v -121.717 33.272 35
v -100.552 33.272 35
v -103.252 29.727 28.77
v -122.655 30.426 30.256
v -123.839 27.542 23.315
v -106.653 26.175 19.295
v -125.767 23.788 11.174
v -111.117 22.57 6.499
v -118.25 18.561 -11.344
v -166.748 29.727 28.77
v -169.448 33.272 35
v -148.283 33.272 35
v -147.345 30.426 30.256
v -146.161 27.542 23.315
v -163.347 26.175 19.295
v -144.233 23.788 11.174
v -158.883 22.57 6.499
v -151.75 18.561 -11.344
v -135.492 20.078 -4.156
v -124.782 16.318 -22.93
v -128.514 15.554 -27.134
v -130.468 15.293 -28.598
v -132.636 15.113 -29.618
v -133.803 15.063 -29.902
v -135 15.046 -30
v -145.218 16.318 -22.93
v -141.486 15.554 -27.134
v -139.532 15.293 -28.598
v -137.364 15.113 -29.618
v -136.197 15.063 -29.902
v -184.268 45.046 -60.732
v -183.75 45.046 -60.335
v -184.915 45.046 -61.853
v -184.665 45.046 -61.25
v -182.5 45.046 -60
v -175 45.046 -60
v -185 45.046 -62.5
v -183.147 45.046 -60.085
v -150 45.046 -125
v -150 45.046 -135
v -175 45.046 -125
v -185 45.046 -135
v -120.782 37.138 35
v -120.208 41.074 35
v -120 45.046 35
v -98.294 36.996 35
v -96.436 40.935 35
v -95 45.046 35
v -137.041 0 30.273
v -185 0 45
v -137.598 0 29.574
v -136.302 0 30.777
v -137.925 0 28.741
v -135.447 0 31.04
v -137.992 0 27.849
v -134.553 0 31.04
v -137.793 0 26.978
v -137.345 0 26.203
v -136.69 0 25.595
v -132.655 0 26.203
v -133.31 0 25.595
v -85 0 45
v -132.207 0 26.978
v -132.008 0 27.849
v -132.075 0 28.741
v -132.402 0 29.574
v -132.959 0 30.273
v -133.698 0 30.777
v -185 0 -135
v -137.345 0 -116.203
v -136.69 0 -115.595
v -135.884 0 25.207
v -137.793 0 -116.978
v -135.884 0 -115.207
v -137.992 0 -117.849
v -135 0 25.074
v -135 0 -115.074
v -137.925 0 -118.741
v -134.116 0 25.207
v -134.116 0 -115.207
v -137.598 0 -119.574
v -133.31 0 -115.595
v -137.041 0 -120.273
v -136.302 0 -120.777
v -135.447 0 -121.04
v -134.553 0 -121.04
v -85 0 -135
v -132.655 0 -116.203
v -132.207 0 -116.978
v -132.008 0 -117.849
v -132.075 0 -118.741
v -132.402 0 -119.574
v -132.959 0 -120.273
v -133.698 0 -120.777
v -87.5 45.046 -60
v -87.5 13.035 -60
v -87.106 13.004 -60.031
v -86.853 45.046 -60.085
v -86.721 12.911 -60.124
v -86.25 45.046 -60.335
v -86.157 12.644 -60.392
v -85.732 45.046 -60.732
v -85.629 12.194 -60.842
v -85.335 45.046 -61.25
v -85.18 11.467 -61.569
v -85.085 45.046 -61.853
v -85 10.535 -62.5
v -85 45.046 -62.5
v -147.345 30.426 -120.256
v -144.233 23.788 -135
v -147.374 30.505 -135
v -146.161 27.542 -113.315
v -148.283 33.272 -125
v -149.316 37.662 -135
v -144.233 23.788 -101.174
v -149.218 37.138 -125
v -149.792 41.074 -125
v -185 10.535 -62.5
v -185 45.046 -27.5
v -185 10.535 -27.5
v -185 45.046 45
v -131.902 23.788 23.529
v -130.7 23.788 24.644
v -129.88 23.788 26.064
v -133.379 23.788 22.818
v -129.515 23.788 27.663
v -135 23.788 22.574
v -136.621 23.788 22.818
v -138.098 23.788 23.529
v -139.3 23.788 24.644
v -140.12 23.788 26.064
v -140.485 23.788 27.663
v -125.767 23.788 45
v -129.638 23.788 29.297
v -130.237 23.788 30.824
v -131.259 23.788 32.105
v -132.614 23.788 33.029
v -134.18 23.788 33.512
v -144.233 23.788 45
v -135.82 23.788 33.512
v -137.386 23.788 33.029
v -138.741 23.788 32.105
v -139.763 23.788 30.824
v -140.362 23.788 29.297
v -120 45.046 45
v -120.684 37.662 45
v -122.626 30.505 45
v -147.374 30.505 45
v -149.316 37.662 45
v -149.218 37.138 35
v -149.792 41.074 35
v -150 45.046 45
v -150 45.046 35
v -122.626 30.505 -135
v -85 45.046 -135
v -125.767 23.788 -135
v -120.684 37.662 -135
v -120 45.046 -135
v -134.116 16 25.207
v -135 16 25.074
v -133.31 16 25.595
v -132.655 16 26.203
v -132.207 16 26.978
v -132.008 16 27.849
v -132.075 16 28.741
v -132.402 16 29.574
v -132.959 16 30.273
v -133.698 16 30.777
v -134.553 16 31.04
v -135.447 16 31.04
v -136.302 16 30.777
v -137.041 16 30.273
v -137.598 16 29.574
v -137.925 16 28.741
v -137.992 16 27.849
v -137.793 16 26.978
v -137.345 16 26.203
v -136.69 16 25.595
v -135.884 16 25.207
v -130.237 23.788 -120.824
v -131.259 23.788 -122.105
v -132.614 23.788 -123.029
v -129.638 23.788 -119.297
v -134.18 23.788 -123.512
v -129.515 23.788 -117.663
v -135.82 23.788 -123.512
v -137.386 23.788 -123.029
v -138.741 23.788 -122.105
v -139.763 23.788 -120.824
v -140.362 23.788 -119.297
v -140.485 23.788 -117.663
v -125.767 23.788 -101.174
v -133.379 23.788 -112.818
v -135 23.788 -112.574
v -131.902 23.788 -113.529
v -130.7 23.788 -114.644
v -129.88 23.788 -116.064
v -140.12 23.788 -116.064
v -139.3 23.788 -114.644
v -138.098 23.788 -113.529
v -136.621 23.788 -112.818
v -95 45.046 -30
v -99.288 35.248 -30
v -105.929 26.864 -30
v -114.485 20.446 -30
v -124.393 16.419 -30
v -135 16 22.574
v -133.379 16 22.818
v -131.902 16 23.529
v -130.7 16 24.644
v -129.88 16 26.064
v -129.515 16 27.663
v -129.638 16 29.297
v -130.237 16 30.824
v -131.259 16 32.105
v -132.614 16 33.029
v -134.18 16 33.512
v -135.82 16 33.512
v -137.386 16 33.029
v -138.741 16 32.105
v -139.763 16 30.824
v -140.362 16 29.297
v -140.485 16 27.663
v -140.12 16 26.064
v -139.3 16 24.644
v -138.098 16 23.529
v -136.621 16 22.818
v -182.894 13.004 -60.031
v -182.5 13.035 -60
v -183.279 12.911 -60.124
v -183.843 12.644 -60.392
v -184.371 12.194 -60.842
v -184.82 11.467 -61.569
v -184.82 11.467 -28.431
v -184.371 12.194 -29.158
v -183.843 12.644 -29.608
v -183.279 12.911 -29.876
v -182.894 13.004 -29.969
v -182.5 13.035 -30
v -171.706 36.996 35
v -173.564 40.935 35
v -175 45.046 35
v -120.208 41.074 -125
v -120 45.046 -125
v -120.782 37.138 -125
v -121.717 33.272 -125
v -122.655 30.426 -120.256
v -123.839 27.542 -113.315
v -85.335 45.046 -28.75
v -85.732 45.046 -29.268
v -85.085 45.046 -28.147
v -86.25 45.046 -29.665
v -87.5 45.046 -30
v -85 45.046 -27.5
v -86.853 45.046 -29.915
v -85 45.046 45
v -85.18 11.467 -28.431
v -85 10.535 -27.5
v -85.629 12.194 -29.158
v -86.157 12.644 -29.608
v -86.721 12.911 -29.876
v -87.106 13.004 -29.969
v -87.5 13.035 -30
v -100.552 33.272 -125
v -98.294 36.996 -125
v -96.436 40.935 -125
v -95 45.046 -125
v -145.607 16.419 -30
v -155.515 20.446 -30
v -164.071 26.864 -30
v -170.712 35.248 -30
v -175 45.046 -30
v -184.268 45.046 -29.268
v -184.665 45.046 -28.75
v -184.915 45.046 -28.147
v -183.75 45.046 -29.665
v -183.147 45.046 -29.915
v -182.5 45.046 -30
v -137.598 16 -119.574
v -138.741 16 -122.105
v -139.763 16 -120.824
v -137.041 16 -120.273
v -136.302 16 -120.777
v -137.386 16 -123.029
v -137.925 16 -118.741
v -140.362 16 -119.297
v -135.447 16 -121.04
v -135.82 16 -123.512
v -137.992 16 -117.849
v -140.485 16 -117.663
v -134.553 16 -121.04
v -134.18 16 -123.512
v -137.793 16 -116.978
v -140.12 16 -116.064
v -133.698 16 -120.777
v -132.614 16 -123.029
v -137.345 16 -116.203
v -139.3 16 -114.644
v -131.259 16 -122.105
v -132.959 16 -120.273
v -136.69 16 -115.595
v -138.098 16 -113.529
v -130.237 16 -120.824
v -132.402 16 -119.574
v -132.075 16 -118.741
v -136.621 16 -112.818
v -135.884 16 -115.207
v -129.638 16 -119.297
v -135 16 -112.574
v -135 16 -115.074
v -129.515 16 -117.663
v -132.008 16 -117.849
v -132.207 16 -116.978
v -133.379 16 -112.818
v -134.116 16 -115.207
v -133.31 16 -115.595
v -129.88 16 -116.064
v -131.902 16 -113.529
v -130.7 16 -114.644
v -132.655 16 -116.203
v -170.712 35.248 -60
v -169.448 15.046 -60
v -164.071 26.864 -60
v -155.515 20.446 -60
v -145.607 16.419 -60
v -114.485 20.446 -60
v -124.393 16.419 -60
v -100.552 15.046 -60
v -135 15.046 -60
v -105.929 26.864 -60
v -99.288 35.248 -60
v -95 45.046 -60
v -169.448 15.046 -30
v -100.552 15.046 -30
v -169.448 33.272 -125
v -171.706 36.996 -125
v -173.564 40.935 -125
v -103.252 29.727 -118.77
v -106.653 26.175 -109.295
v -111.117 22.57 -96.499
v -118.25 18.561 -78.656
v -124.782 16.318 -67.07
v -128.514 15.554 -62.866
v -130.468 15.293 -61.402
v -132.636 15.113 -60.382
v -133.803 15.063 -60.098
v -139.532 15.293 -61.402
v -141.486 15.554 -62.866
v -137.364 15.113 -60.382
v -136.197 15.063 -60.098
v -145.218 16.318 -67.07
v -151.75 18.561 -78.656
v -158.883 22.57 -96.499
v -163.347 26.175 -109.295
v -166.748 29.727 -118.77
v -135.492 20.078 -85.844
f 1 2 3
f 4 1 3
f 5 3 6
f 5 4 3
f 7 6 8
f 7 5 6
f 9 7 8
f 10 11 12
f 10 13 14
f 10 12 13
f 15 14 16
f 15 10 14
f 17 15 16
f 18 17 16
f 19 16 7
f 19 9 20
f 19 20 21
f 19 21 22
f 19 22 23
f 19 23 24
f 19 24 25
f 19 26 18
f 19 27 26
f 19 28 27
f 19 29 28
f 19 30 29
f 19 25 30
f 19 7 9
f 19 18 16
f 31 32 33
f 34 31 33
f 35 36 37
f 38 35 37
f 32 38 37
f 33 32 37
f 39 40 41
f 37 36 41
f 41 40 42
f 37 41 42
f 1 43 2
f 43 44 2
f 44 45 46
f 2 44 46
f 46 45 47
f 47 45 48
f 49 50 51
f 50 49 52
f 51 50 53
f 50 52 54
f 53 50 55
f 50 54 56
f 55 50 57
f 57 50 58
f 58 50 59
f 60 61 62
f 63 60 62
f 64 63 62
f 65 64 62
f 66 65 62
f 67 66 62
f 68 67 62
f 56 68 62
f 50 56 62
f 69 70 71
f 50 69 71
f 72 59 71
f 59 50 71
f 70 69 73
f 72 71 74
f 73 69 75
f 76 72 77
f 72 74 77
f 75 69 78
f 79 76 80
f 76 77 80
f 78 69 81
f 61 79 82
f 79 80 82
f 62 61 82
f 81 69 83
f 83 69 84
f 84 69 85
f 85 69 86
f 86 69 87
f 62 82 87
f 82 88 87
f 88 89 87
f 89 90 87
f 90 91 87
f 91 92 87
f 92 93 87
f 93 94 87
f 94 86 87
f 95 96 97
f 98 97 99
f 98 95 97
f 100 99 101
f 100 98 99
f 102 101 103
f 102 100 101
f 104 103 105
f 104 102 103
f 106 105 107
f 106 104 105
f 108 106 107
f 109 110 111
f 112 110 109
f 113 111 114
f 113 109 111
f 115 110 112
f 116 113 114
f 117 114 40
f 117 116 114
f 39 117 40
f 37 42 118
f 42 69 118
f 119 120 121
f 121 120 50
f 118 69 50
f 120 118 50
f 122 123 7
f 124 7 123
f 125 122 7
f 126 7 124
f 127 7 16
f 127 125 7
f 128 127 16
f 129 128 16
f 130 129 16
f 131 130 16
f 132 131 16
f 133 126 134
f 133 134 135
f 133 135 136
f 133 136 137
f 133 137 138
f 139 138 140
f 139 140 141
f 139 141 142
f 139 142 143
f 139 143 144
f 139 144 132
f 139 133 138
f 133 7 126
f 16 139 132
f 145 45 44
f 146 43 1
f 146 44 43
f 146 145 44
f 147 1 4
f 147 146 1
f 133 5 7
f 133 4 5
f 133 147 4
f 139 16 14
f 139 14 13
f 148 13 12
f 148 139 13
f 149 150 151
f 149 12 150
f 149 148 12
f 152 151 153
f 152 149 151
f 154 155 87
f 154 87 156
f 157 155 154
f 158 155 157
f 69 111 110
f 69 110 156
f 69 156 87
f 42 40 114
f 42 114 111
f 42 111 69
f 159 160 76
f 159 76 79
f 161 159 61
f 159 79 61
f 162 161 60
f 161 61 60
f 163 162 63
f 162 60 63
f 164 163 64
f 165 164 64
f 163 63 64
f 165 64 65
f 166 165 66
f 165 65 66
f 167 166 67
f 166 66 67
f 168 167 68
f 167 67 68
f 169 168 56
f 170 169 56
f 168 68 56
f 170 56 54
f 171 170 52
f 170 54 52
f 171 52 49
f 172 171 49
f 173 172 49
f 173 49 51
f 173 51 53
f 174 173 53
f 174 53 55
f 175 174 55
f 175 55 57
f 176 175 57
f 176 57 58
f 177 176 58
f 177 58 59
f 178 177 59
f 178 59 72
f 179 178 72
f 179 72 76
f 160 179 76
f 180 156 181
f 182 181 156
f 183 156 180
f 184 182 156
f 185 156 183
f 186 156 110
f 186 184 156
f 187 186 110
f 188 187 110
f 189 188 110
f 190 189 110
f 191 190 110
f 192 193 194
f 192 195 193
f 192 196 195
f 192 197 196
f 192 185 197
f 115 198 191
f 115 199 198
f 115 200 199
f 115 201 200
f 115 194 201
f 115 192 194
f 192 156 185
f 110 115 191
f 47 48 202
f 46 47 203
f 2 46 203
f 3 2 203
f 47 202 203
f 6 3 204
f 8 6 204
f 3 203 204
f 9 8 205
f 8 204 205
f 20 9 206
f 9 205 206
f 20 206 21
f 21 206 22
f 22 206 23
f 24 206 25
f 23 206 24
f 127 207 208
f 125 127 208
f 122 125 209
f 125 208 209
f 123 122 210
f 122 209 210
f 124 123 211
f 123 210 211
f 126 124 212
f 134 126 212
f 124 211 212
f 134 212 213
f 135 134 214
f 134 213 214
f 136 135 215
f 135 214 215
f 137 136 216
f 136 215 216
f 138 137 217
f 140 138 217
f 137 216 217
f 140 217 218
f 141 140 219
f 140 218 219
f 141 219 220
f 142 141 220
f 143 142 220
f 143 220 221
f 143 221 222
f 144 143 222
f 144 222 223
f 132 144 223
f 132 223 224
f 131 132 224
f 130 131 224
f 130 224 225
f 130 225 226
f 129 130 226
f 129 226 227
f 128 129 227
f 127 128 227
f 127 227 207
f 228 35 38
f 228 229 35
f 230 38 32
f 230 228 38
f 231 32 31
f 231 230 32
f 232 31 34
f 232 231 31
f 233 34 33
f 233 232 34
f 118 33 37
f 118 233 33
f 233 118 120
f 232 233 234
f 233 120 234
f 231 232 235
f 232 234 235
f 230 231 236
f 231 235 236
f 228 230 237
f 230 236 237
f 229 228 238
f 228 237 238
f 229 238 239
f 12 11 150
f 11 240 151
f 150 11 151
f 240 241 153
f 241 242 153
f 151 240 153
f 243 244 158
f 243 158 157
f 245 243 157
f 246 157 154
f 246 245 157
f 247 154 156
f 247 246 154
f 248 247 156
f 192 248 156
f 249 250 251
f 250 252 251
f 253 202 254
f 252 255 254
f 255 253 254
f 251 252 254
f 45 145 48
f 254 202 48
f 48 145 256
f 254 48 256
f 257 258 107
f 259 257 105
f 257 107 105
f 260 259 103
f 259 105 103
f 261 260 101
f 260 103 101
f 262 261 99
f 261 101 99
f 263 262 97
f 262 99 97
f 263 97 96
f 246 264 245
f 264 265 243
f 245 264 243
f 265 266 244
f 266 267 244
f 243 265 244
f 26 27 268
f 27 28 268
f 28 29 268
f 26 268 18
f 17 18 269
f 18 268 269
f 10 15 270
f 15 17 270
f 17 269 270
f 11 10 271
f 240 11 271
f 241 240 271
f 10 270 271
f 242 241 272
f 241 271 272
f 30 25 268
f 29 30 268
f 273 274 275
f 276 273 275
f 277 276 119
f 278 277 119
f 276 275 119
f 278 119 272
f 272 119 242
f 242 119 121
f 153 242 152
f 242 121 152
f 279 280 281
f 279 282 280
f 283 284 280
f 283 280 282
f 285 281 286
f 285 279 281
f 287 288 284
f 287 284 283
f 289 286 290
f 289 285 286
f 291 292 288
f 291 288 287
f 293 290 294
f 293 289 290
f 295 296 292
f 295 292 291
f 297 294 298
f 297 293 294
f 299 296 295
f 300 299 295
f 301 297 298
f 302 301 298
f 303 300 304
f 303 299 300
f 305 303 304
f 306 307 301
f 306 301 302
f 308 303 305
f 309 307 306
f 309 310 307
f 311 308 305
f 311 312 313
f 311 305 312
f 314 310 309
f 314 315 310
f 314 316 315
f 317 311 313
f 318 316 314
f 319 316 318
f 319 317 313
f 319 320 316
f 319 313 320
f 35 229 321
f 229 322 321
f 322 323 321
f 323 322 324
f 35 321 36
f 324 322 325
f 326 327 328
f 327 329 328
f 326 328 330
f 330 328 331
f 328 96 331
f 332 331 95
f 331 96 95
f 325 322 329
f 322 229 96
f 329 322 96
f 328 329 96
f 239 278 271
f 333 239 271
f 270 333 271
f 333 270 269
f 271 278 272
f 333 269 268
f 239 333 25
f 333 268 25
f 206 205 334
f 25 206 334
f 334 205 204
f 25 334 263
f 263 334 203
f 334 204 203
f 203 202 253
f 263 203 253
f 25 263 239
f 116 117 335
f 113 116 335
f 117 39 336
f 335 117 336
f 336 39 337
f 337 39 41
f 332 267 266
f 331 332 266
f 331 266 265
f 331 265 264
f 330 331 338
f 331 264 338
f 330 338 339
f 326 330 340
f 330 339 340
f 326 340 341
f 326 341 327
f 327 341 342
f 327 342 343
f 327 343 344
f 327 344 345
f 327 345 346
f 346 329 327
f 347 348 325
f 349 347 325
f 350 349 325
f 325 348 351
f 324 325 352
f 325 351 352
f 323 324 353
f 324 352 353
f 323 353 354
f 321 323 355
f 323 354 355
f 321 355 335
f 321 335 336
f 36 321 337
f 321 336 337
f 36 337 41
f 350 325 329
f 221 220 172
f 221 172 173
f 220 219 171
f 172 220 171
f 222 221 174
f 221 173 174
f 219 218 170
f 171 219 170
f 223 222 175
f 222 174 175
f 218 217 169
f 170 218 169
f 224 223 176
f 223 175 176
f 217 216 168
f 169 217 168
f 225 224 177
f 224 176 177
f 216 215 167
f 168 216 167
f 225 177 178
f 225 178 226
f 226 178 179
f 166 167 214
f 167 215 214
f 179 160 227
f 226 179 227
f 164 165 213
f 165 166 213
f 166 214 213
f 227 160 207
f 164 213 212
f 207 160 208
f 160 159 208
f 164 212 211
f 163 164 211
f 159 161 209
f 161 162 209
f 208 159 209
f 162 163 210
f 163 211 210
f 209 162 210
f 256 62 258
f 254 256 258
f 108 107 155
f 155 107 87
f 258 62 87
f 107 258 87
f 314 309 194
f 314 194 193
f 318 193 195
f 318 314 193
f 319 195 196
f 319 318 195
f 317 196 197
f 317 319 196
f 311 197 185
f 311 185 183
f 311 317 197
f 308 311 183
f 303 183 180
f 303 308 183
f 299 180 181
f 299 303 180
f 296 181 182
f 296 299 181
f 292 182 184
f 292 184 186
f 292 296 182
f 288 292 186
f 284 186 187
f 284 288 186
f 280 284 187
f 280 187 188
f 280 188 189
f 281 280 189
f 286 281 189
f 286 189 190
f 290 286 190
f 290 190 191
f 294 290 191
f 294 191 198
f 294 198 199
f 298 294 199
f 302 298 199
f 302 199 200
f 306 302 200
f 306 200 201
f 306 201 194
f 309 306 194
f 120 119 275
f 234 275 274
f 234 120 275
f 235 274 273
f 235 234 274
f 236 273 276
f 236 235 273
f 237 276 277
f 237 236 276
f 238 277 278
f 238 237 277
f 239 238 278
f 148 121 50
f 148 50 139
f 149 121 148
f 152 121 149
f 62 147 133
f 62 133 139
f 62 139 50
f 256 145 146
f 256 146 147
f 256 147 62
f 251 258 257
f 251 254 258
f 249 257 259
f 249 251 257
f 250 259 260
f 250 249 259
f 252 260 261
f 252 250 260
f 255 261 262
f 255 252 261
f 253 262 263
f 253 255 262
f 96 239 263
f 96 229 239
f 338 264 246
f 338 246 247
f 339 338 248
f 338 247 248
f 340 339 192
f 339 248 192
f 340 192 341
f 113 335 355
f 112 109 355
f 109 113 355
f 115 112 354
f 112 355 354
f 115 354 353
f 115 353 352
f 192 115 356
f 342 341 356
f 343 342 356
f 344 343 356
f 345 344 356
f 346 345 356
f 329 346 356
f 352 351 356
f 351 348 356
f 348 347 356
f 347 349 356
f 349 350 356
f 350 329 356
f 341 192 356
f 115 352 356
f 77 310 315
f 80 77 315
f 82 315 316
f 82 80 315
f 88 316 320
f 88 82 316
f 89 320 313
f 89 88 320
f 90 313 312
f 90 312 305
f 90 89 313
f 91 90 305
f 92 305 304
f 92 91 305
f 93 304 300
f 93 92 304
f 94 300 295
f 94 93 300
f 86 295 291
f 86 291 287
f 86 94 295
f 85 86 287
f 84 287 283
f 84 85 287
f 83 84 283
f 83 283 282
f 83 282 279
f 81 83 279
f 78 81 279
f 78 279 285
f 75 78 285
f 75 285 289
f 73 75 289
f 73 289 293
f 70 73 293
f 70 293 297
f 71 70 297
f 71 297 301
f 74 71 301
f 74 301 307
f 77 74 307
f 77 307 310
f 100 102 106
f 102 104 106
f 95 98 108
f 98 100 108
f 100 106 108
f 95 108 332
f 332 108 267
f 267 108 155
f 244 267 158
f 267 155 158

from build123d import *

# Parameters (mm, degrees)
BOSS_EXTRUDE1_DEPTH     = 15.045877519
BOSS_EXTRUDE2_DEPTH     = 30
BOSS_EXTRUDE3_DEPTH     = 160
CUT_EXTRUDE1_DEPTH      = 397.42670329
CUT_EXTRUDE1_DEPTH_BACK = 397.42670329
SKETCH5_W               = 30
SKETCH5_H               = 30
CUT_EXTRUDE2_START      = -30
CUT_EXTRUDE2_DEPTH      = 30
CUT_EXTRUDE3_DEPTH      = 2.010455065
BOSS_EXTRUDE6_START     = -34.448076
BOSS_EXTRUDE6_DEPTH     = 68.896152
SKETCH13_W              = 15
SKETCH13_H              = 30
BOSS_EXTRUDE7_DEPTH     = 10
SKETCH14_W              = 15
SKETCH14_H              = 30
BOSS_EXTRUDE8_DEPTH     = 10
CUT_EXTRUDE6_DEPTH      = 192
SKETCH18_R              = 3
CUT_EXTRUDE7_DEPTH      = 192
CUT_EXTRUDE8_REACH      = 232.854
SKETCH19_R              = 5.5
FILLET2_R               = 2.5


# Read off the part's stored shape, not the designer's step: Boss-Extrude3
with BuildPart() as part:
    # Sketch1 → Boss-Extrude1 (new body)
    with BuildSketch(Plane(origin=(0, 0, 0), x_dir=(1, 0, 0), z_dir=(0, 1, 0))):
        with BuildLine():
            Line((-185, -65), (5, -65))
            ThreePointArc((5, -65), (60.514401442, -84.704810384), (91.182336182, -135))
            Line((91.182336182, -135), (185, -135))
            Line((185, -135), (185, 135))
            Line((185, 135), (-185, 135))
            Line((-185, 135), (-185, -65))
        make_face()
    extrude(amount=BOSS_EXTRUDE1_DEPTH)

    # Sketch2 → Boss-Extrude2 (add)
    with BuildSketch(Plane(origin=(0, 15.045877519, 0), x_dir=(1, 0, 0), z_dir=(0, 1, 0))):
        Polygon((-175, -35), (-175, 30), (-185, 30), (-185, -45), (-142.5, -45), (-142.5, -35), align=None)
        Polygon((-175, 125), (-142.5, 125), (-142.5, 135), (-185, 135), (-185, 60), (-175, 60), align=None)
        Polygon((-95, -35), (-95, 30), (-85, 30), (-85, -45), (-127.5, -45), (-127.5, -35), align=None)
        Polygon((-127.5, 135), (-127.5, 125), (-95, 125), (-95, 60), (-85, 60), (-85, 135), align=None)
    extrude(amount=BOSS_EXTRUDE2_DEPTH)

    # Boss-Extrude3 outline → Boss-Extrude3 (add)
    with BuildSketch(Plane.XY.offset(-125)):
        with BuildLine():
            ThreePointArc((-95, 45.045877519), (-110, 23.379210852), (-135, 15.045877519))
            Line((-135, 15.045877519), (-95, 15.045877519))
            Line((-95, 15.045877519), (-95, 45.045877519))
        make_face()
        with BuildLine():
            Line((-175, 45.045877519), (-175, 15.045877519))
            Line((-175, 15.045877519), (-135, 15.045877519))
            ThreePointArc((-135, 15.045877519), (-160, 23.379210852), (-175, 45.045877519))
        make_face()
    extrude(amount=BOSS_EXTRUDE3_DEPTH)

    # Sketch5 → Cut-Extrude1 (cut, two sides: drawn at the far end of the back side and taken through both)
    with BuildSketch(Plane.ZY.offset(185).offset(-CUT_EXTRUDE1_DEPTH_BACK)):
        with Locations((-45, 30.045877519)):
            Rectangle(SKETCH5_W, SKETCH5_H)
    extrude(amount=CUT_EXTRUDE1_DEPTH + CUT_EXTRUDE1_DEPTH_BACK, mode=Mode.SUBTRACT)

    # Sketch6 → Cut-Extrude2 (cut)
    with BuildSketch(Plane(origin=(0, 15.045877519, 0), x_dir=(1, 0, 0), z_dir=(0, 1, 0)).offset(CUT_EXTRUDE2_START)):
        with BuildLine():
            Line((-85, 135), (-85, 60))
            Line((-85, 60), (-85, 30))
            Line((-85, 30), (-85, -45))
            Line((-85, -45), (-127.5, -45))
            Line((-127.5, -45), (-142.5, -45))
            Line((-142.5, -45), (-185, -45))
            Line((-185, -45), (-185, -65))
            Line((-185, -65), (5, -65))
            ThreePointArc((5, -65), (60.514401442, -84.704810384), (91.182336182, -135))
            Line((91.182336182, -135), (185, -135))
            Line((185, -135), (185, 135))
            Line((185, 135), (-85, 135))
        make_face()
    extrude(amount=CUT_EXTRUDE2_DEPTH, mode=Mode.SUBTRACT)

    # Sketch8 → Cut-Extrude3 (cut)
    with BuildSketch(Plane(origin=(0, 15.045877519, 0), x_dir=(1, 0, 0), z_dir=(0, 1, 0))):
        Polygon((-135, 60), (-185, 60), (-185, 30), (-135, 30), (-85, 30), (-85, 60), align=None)
    extrude(amount=-CUT_EXTRUDE3_DEPTH, mode=Mode.SUBTRACT)

    # Sketch12 → Boss-Extrude6 (add)
    with BuildSketch(Plane(origin=(-135, 0, 0), x_dir=(0, 0, -1), z_dir=(1, 0, 0)).offset(BOSS_EXTRUDE6_START)):
        with BuildLine():
            Line((-35, 33.272382456), (-35, 15.00790917))
            Line((-35, 15.00790917), (30, 15.045877519))
            add(Edge.make_bspline(
                [(-35, 33.272382456), (-23.622698209, 24.45769668), (30, 15.045877519)],
                knots=[0, 0, 0, 1, 1, 1], degree=2))
        make_face()
    boss_extrude6 = extrude(amount=BOSS_EXTRUDE6_DEPTH)

    # Sketch13 → Boss-Extrude7 (add)
    with BuildSketch(Plane.XY.offset(45)):
        with Locations((-135, 30.045877519)):
            Rectangle(SKETCH13_W, SKETCH13_H)
    extrude(amount=-BOSS_EXTRUDE7_DEPTH)

    # Sketch14 → Boss-Extrude8 (add)
    with BuildSketch(Plane(origin=(0, 0, -135), x_dir=(-1, 0, 0), z_dir=(0, 0, -1))):
        with Locations((135, 30.045877519)):
            Rectangle(SKETCH14_W, SKETCH14_H)
    extrude(amount=-BOSS_EXTRUDE8_DEPTH)

    # Mirror3: Boss-Extrude6 across plane
    add(boss_extrude6.mirror(Plane.XY.offset(-45)))

    # Sketch9 → Cut-Extrude6 (cut)
    with BuildSketch(Plane.XY.offset(45)):
        with BuildLine():
            Line((-150, 45.045877519), (-120, 45.045877519))
            ThreePointArc((-120, 45.045877519), (-121.500780237, 34.041891851), (-125.767198961, 23.788223571))
            Line((-125.767198961, 23.788223571), (-144.232801039, 23.788223571))
            ThreePointArc((-144.232801039, 23.788223571), (-148.499219763, 34.041891851), (-150, 45.045877519))
        make_face()
    extrude(amount=-CUT_EXTRUDE6_DEPTH, mode=Mode.SUBTRACT)

    # Sketch18 → Cut-Extrude7 (cut)
    with BuildSketch(Plane.XZ):
        with Locations(Location((-135, 28.073614807, 0), (0, 0, 270))):
            Circle(SKETCH18_R)
    cut_extrude7 = extrude(amount=-CUT_EXTRUDE7_DEPTH, mode=Mode.SUBTRACT)

    # Sketch19 → Cut-Extrude8 (cut, up to next)
    with BuildSketch(Plane(origin=(0, 16, 0), x_dir=(-1, 0, 0), z_dir=(0, -1, 0)), mode=Mode.PRIVATE) as cut_extrude8_sk1:
        with Locations(Location((135, -28.073614807, 0), (0, 0, 90))):
            Circle(SKETCH19_R)
    cut_extrude8_tool1 = extrude(cut_extrude8_sk1.sketch, amount=-CUT_EXTRUDE8_REACH, mode=Mode.PRIVATE) & part.part
    cut_extrude8 = cut_extrude8_tool1.solids().sort_by_distance((-135, 16, 28.073615))[0]
    add(cut_extrude8, mode=Mode.SUBTRACT)

    # Mirror4: Cut-Extrude7, Cut-Extrude8 across plane
    add(cut_extrude7.mirror(Plane.XY.offset(-45)), mode=Mode.SUBTRACT)
    add(cut_extrude8.mirror(Plane.XY.offset(-45)), mode=Mode.SUBTRACT)

    # Fillet2
    fillet2_edges = [part.edges().sort_by_distance(p)[0] for p in [
        (-85, 13.035422455, -45),
        (-185, 13.035422455, -45),
        (-185, 29.040649987, -30),
        (-185, 29.040649987, -60),
        (-85, 29.040649987, -60),
        (-85, 29.040649987, -30),
    ]]
    fillet(fillet2_edges, radius=FILLET2_R)


solid = part.part
